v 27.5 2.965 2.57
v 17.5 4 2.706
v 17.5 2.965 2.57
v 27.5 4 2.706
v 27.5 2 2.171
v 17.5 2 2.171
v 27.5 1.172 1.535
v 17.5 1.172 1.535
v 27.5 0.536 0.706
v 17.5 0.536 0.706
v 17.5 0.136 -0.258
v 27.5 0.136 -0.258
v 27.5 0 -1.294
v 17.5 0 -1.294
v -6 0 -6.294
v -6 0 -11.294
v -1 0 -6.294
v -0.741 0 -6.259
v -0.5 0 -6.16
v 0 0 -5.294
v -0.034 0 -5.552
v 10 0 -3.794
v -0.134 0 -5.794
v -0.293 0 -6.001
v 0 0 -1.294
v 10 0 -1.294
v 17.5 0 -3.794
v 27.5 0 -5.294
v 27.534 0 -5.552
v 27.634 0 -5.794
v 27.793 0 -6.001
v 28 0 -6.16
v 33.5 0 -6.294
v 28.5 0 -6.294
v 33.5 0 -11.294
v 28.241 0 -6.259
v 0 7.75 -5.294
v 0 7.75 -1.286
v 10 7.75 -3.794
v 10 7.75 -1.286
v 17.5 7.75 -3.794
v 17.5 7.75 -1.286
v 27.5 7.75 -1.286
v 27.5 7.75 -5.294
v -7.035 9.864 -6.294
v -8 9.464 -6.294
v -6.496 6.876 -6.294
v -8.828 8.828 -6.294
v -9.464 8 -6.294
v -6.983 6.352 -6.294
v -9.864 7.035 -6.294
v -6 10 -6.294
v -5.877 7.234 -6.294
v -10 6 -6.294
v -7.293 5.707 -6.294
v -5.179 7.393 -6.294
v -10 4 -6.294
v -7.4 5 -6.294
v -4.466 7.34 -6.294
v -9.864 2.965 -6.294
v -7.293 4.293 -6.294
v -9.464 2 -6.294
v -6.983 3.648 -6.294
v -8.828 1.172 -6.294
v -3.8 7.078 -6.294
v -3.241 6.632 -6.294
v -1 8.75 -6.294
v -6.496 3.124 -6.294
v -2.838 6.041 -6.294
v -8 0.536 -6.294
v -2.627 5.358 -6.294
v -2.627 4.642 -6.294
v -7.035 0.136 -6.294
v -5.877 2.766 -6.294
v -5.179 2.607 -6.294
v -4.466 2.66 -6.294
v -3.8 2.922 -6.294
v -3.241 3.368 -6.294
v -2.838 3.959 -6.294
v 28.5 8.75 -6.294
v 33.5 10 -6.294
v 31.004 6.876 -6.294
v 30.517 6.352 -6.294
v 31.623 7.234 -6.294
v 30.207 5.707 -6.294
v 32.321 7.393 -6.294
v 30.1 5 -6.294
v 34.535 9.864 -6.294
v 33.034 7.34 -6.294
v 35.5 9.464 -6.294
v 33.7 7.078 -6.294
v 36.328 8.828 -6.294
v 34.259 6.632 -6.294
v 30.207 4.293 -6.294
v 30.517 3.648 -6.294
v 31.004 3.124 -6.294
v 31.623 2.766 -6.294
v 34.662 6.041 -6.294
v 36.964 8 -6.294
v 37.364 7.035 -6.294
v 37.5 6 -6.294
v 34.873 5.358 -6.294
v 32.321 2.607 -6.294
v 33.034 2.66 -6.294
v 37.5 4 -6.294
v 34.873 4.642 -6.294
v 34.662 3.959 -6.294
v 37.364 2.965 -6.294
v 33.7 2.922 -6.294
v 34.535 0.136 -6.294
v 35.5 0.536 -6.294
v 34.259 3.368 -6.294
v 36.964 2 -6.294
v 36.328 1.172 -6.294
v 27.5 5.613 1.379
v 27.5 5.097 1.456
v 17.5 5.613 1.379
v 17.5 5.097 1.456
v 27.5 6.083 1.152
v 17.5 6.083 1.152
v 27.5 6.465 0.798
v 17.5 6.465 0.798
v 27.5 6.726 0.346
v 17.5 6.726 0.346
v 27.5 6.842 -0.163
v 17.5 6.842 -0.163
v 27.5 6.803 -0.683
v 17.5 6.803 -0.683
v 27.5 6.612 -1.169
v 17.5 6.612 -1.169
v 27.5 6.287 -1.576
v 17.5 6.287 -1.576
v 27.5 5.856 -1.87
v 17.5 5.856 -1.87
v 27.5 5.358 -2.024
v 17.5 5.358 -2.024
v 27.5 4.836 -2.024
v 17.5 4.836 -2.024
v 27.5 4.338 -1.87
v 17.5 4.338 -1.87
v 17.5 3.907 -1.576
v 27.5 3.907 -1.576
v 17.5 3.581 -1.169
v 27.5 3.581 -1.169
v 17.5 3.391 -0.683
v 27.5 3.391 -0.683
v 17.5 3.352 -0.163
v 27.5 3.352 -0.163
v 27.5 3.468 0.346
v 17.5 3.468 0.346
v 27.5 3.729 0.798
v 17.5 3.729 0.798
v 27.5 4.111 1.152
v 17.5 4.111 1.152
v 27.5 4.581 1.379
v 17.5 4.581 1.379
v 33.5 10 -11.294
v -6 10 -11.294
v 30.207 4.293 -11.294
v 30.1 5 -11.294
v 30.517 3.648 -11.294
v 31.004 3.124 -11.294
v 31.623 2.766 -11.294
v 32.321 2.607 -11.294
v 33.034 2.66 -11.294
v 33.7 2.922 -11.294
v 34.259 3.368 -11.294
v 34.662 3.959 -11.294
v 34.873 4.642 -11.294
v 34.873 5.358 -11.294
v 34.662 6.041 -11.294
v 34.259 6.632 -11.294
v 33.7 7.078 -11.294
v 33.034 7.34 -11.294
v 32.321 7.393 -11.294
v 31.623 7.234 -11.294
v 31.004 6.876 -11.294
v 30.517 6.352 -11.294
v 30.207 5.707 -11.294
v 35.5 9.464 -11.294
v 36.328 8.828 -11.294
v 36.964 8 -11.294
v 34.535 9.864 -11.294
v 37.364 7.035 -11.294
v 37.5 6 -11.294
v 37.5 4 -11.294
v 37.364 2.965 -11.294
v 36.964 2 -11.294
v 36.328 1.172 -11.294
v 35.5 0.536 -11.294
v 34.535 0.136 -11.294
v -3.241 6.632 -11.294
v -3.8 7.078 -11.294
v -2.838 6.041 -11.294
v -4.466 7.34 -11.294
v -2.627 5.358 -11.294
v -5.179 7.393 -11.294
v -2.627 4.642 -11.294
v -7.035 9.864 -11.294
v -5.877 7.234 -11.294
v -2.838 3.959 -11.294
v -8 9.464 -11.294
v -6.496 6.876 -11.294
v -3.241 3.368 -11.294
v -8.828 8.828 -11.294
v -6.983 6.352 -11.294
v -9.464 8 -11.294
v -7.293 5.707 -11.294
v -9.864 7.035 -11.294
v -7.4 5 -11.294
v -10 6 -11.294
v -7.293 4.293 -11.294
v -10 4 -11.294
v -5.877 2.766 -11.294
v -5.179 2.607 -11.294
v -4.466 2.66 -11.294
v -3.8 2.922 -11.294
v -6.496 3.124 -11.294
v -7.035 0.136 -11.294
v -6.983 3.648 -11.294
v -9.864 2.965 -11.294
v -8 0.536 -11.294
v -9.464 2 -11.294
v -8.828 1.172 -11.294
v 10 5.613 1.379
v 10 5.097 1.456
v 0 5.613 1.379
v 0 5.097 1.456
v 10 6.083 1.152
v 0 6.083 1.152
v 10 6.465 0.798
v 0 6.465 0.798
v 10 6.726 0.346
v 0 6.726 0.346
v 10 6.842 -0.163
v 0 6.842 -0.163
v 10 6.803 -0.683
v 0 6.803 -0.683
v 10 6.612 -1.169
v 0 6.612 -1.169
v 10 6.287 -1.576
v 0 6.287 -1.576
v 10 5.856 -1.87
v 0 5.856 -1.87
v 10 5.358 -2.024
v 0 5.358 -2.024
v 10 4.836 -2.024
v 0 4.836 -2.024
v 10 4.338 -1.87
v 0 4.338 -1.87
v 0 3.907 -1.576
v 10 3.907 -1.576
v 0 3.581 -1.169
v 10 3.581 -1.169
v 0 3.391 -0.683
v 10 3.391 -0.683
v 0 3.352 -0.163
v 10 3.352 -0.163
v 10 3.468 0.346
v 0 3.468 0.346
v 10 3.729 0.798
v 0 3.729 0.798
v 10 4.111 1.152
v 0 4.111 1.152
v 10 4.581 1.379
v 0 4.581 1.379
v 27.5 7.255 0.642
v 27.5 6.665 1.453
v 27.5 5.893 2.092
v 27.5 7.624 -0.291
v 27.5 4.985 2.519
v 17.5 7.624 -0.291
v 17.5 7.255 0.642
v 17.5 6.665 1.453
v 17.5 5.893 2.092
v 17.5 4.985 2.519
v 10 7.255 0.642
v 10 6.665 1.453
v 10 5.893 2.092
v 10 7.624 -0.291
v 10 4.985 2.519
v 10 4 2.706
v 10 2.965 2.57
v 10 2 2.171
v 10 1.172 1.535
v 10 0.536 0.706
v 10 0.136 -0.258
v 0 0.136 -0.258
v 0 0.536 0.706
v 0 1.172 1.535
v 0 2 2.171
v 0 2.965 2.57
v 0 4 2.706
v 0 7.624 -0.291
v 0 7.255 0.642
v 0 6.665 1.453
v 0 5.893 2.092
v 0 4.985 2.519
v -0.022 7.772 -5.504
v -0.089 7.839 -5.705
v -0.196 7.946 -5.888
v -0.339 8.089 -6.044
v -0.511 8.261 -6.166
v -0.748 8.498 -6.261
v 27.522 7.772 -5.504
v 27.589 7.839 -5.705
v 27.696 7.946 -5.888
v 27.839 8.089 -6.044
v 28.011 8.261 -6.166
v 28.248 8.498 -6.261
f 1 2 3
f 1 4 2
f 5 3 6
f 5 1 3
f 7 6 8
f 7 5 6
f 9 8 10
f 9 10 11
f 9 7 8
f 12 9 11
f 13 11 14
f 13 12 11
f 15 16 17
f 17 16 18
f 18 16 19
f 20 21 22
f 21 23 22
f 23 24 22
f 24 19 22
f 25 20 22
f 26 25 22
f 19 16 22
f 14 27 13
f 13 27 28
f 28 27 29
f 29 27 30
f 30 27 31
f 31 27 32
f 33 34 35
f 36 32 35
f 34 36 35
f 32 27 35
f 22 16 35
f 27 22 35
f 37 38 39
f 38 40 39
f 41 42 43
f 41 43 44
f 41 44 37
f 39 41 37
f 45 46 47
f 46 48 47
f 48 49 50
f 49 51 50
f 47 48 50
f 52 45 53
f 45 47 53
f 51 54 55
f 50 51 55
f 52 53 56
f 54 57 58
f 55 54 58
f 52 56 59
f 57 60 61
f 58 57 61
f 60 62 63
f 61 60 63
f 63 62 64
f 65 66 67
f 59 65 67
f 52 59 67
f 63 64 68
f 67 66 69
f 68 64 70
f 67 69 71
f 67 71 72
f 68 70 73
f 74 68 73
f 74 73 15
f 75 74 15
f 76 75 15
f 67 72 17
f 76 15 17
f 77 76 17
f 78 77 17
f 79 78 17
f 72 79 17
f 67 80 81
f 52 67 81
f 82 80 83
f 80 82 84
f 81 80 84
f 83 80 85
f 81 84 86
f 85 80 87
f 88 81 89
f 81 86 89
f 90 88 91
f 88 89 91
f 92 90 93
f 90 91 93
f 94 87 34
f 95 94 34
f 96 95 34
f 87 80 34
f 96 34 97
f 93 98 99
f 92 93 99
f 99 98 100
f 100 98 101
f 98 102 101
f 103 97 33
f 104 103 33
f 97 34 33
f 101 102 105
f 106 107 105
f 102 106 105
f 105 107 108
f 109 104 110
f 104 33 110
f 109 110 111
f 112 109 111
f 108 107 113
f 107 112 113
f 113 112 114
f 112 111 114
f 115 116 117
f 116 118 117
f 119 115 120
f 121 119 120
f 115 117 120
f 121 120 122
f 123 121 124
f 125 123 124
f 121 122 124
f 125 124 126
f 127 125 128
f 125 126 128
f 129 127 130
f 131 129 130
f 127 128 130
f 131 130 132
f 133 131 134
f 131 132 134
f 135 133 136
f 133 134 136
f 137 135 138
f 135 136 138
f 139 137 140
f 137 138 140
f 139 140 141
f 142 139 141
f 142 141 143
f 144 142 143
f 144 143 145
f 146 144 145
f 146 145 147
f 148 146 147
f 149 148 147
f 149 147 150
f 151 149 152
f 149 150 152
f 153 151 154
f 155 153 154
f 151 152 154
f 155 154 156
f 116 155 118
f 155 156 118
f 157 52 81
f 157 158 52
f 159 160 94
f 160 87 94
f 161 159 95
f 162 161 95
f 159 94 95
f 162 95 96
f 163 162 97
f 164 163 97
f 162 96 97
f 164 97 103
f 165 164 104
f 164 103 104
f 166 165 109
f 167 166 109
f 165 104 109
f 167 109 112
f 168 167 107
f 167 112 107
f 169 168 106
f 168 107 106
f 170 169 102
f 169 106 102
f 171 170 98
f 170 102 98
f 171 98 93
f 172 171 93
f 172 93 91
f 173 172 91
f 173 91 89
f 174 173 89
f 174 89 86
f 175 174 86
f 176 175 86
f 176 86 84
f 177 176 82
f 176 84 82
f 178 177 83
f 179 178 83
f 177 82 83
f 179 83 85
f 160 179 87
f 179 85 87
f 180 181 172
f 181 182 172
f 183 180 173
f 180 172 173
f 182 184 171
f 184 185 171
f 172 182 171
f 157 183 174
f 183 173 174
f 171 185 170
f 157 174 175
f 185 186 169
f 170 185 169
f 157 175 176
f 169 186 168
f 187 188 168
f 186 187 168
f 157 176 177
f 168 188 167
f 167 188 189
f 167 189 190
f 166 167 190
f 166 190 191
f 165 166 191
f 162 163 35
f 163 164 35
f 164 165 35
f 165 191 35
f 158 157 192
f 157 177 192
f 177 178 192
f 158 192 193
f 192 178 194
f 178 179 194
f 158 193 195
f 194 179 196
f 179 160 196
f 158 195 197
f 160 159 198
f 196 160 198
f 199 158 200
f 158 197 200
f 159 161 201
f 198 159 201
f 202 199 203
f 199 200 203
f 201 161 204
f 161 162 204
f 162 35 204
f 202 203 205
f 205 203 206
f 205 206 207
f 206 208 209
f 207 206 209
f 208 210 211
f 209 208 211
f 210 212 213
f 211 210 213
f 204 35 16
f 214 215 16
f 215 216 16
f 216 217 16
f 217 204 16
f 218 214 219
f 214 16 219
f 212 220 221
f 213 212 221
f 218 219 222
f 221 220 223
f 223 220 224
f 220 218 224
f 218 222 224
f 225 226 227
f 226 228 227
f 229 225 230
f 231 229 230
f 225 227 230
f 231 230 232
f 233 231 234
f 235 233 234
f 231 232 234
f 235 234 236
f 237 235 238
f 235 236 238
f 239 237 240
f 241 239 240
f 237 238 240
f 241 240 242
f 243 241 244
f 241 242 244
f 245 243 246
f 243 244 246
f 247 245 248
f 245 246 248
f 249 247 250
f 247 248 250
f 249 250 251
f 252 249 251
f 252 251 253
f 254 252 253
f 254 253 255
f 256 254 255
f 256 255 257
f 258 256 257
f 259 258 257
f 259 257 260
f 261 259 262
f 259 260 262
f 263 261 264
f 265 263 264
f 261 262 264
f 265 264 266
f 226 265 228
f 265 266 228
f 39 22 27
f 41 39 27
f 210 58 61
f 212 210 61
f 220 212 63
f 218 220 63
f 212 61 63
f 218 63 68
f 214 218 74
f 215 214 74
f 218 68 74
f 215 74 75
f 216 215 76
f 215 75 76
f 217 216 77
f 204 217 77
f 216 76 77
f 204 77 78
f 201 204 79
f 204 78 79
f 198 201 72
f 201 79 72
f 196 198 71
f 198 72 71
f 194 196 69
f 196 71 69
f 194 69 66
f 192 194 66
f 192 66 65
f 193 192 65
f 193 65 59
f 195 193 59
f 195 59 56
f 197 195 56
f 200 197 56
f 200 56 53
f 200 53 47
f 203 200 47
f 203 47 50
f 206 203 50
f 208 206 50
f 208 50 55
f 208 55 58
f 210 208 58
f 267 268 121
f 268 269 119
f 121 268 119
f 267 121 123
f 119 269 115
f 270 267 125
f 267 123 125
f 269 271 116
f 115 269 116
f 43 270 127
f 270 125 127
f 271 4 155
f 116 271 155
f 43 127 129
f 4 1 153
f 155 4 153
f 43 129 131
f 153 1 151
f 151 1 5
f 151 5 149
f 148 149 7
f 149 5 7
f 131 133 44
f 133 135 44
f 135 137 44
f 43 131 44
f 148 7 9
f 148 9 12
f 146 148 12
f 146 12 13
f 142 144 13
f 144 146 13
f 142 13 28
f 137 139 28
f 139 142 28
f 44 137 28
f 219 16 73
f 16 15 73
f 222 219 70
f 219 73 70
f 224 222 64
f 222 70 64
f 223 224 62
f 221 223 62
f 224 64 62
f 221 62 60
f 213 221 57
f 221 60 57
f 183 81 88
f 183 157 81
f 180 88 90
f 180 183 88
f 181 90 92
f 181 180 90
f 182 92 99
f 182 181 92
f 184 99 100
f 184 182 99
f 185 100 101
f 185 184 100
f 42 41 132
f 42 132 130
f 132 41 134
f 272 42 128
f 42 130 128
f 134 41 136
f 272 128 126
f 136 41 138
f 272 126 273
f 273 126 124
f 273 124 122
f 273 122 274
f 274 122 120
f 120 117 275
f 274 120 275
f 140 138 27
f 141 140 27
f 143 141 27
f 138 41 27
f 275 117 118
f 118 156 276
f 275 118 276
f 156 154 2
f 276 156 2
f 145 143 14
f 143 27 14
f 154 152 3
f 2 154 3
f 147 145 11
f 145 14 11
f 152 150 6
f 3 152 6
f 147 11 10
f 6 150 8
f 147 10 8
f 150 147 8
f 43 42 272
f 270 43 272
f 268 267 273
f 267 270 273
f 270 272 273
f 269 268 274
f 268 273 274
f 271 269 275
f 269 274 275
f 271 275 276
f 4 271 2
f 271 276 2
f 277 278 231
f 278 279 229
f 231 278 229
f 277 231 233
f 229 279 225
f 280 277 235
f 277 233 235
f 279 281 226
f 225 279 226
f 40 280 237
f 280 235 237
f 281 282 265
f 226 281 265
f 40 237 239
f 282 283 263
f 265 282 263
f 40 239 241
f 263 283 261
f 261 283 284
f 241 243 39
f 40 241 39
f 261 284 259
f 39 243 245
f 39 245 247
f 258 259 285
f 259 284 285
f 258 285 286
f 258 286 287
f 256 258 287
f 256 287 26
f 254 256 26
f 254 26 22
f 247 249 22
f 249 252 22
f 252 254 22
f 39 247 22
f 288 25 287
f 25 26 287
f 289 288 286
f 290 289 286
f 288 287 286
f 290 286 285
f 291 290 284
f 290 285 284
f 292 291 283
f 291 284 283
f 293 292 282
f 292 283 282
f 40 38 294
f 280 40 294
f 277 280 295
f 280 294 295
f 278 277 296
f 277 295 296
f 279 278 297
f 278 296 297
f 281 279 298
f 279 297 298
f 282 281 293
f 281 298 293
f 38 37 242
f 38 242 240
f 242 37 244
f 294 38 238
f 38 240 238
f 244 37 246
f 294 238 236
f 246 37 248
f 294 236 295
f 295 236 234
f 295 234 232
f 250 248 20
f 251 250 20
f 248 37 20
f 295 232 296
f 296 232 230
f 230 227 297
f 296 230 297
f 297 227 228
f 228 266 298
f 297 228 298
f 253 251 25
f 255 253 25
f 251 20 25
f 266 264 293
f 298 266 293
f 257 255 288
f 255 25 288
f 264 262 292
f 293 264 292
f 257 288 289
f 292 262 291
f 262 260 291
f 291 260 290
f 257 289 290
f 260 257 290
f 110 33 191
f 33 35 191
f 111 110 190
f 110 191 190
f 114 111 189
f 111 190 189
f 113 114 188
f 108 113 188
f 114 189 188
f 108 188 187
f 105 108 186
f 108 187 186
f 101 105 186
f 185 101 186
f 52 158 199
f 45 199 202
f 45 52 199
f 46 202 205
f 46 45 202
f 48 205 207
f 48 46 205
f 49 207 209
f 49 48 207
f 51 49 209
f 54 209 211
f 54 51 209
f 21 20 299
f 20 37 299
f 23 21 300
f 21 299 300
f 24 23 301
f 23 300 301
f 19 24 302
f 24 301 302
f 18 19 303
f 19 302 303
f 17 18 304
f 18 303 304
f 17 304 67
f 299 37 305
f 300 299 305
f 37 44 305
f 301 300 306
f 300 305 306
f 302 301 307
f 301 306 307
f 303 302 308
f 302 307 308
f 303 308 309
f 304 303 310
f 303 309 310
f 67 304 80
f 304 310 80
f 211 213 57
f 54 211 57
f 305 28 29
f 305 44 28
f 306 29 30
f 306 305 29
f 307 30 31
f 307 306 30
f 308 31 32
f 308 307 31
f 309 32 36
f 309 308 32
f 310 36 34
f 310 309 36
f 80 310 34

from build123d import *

# Parameters (mm, degrees)
BOSS_EXTRUDE1_DEPTH = 10
SKETCH2_R           = 1.75
CUT_EXTRUDE1_DEPTH  = 30
SKETCH3_R           = 2.4
CUT_EXTRUDE2_DEPTH  = 15.5
FILLET2_R           = 4
FILLET3_R           = 4
SKETCH5_W           = 9
SKETCH5_H           = 2.25
CUT_EXTRUDE3_DEPTH  = 33
FILLET4_R           = 4
FILLET5_R           = 1


with BuildPart() as part:
    # Sketch1 → Boss-Extrude1 (new body)
    with BuildSketch(Plane(origin=(0, 0, 0), x_dir=(1, 0, 0), z_dir=(0, 1, 0))):
        Polygon((17.5, -2.706437242), (27.5, -2.706437242), (27.5, 6.293562758), (37.5, 6.293562758), (37.5, 11.293562758), (-10, 11.293562758), (-10, 6.293562758), (0, 6.293562758), (0, 0), (0, -2.706437242), (10, -2.706437242), (10, 3.793562758), (17.5, 3.793562758), align=None)
    extrude(amount=BOSS_EXTRUDE1_DEPTH)

    # Sketch2 → Cut-Extrude1 (cut, symmetric)
    with BuildSketch(Plane.ZY.offset(-17.5)):
        with Locations((-0.293562758, 5.096871602)):
            Circle(SKETCH2_R)
    extrude(amount=CUT_EXTRUDE1_DEPTH, both=True, mode=Mode.SUBTRACT)

    # Sketch3 → Cut-Extrude2 (cut, symmetric)
    with BuildSketch(Plane.XY.offset(-6.293562758)):
        with Locations(Location((-5, 5, 0), (0, 0, 180))):
            Circle(SKETCH3_R)
        with Locations(Location((32.5, 5, 0), (0, 0, 180))):
            Circle(SKETCH3_R)
    extrude(amount=CUT_EXTRUDE2_DEPTH, both=True, mode=Mode.SUBTRACT)

    # Fillet2
    fillet2_edges = [part.edges().sort_by_distance(p)[0] for p in [
        (22.5, 0, 2.706437242),
        (5, 0, 2.706437242),
    ]]
    fillet(fillet2_edges, radius=FILLET2_R)

    # Fillet3
    fillet3_edges = [part.edges().sort_by_distance(p)[0] for p in [
        (37.5, 10, -8.793562758),
        (-10, 0, -8.793562758),
        (37.5, 0, -8.793562758),
        (-10, 10, -8.793562758),
    ]]
    fillet(fillet3_edges, radius=FILLET3_R)

    # Sketch5 → Cut-Extrude3 (cut, symmetric)
    with BuildSketch(Plane(origin=(27.5, 0, 0), x_dir=(0, 0, -1), z_dir=(1, 0, 0))):
        with Locations((1.793562758, 8.875)):
            Rectangle(SKETCH5_W, SKETCH5_H)
    extrude(amount=CUT_EXTRUDE3_DEPTH, both=True, mode=Mode.SUBTRACT)

    # Fillet4
    # the kernel refuses this fillet: 4 mm, written as the material it takes off along each edge
    with BuildSketch(Plane(origin=(7.519550361, 7.75, 2.706437242), x_dir=(0, 0, -1), z_dir=(1, 0, 0))) as fillet4_piece_1:
        with BuildLine():
            CenterArc((3.992179856, -4), FILLET4_R, 90, 86.416678302)
            Line((0, -3.75), (-0.079843597, -3.745))
            ThreePointArc((-0.079843597, -3.745), (-0.08, -1.875), (-0.08, 0))
            Line((-0.08, 0), (0, 0.08))
            Line((0, 0.08), (3.992179856, 0.08))
            Line((3.992179856, 0.08), (3.992179856, 0))
        make_face()
    extrude(amount=29.960899278, mode=Mode.SUBTRACT)
    with BuildSketch(Plane(origin=(-9.980449639, 7.75, 2.706437242), x_dir=(0, -1, 0), z_dir=(1, 0, 0))) as fillet4_piece_2:
        with BuildLine():
            CenterArc((4, 3.992179856), FILLET4_R, 180, 86.416678302)
            Line((0, 3.992179856), (-0.08, 3.992179856))
            Line((-0.08, 3.992179856), (-0.08, 0))
            Line((-0.08, 0), (0, -0.08))
            ThreePointArc((0, -0.08), (1.875, -0.08), (3.745, -0.079843597))
            Line((3.745, -0.079843597), (3.75, 0))
        make_face()
    extrude(amount=29.960899278, mode=Mode.SUBTRACT)

    # Fillet5
    fillet5_edges = [part.edges().sort_by_distance(p)[0] for p in [
        (27.5, 3.875, -6.293562758),
        (0, 3.875, -6.293562758),
        (13.75, 7.75, -6.293562758),
    ]]
    fillet(fillet5_edges, radius=FILLET5_R)


solid = part.part
